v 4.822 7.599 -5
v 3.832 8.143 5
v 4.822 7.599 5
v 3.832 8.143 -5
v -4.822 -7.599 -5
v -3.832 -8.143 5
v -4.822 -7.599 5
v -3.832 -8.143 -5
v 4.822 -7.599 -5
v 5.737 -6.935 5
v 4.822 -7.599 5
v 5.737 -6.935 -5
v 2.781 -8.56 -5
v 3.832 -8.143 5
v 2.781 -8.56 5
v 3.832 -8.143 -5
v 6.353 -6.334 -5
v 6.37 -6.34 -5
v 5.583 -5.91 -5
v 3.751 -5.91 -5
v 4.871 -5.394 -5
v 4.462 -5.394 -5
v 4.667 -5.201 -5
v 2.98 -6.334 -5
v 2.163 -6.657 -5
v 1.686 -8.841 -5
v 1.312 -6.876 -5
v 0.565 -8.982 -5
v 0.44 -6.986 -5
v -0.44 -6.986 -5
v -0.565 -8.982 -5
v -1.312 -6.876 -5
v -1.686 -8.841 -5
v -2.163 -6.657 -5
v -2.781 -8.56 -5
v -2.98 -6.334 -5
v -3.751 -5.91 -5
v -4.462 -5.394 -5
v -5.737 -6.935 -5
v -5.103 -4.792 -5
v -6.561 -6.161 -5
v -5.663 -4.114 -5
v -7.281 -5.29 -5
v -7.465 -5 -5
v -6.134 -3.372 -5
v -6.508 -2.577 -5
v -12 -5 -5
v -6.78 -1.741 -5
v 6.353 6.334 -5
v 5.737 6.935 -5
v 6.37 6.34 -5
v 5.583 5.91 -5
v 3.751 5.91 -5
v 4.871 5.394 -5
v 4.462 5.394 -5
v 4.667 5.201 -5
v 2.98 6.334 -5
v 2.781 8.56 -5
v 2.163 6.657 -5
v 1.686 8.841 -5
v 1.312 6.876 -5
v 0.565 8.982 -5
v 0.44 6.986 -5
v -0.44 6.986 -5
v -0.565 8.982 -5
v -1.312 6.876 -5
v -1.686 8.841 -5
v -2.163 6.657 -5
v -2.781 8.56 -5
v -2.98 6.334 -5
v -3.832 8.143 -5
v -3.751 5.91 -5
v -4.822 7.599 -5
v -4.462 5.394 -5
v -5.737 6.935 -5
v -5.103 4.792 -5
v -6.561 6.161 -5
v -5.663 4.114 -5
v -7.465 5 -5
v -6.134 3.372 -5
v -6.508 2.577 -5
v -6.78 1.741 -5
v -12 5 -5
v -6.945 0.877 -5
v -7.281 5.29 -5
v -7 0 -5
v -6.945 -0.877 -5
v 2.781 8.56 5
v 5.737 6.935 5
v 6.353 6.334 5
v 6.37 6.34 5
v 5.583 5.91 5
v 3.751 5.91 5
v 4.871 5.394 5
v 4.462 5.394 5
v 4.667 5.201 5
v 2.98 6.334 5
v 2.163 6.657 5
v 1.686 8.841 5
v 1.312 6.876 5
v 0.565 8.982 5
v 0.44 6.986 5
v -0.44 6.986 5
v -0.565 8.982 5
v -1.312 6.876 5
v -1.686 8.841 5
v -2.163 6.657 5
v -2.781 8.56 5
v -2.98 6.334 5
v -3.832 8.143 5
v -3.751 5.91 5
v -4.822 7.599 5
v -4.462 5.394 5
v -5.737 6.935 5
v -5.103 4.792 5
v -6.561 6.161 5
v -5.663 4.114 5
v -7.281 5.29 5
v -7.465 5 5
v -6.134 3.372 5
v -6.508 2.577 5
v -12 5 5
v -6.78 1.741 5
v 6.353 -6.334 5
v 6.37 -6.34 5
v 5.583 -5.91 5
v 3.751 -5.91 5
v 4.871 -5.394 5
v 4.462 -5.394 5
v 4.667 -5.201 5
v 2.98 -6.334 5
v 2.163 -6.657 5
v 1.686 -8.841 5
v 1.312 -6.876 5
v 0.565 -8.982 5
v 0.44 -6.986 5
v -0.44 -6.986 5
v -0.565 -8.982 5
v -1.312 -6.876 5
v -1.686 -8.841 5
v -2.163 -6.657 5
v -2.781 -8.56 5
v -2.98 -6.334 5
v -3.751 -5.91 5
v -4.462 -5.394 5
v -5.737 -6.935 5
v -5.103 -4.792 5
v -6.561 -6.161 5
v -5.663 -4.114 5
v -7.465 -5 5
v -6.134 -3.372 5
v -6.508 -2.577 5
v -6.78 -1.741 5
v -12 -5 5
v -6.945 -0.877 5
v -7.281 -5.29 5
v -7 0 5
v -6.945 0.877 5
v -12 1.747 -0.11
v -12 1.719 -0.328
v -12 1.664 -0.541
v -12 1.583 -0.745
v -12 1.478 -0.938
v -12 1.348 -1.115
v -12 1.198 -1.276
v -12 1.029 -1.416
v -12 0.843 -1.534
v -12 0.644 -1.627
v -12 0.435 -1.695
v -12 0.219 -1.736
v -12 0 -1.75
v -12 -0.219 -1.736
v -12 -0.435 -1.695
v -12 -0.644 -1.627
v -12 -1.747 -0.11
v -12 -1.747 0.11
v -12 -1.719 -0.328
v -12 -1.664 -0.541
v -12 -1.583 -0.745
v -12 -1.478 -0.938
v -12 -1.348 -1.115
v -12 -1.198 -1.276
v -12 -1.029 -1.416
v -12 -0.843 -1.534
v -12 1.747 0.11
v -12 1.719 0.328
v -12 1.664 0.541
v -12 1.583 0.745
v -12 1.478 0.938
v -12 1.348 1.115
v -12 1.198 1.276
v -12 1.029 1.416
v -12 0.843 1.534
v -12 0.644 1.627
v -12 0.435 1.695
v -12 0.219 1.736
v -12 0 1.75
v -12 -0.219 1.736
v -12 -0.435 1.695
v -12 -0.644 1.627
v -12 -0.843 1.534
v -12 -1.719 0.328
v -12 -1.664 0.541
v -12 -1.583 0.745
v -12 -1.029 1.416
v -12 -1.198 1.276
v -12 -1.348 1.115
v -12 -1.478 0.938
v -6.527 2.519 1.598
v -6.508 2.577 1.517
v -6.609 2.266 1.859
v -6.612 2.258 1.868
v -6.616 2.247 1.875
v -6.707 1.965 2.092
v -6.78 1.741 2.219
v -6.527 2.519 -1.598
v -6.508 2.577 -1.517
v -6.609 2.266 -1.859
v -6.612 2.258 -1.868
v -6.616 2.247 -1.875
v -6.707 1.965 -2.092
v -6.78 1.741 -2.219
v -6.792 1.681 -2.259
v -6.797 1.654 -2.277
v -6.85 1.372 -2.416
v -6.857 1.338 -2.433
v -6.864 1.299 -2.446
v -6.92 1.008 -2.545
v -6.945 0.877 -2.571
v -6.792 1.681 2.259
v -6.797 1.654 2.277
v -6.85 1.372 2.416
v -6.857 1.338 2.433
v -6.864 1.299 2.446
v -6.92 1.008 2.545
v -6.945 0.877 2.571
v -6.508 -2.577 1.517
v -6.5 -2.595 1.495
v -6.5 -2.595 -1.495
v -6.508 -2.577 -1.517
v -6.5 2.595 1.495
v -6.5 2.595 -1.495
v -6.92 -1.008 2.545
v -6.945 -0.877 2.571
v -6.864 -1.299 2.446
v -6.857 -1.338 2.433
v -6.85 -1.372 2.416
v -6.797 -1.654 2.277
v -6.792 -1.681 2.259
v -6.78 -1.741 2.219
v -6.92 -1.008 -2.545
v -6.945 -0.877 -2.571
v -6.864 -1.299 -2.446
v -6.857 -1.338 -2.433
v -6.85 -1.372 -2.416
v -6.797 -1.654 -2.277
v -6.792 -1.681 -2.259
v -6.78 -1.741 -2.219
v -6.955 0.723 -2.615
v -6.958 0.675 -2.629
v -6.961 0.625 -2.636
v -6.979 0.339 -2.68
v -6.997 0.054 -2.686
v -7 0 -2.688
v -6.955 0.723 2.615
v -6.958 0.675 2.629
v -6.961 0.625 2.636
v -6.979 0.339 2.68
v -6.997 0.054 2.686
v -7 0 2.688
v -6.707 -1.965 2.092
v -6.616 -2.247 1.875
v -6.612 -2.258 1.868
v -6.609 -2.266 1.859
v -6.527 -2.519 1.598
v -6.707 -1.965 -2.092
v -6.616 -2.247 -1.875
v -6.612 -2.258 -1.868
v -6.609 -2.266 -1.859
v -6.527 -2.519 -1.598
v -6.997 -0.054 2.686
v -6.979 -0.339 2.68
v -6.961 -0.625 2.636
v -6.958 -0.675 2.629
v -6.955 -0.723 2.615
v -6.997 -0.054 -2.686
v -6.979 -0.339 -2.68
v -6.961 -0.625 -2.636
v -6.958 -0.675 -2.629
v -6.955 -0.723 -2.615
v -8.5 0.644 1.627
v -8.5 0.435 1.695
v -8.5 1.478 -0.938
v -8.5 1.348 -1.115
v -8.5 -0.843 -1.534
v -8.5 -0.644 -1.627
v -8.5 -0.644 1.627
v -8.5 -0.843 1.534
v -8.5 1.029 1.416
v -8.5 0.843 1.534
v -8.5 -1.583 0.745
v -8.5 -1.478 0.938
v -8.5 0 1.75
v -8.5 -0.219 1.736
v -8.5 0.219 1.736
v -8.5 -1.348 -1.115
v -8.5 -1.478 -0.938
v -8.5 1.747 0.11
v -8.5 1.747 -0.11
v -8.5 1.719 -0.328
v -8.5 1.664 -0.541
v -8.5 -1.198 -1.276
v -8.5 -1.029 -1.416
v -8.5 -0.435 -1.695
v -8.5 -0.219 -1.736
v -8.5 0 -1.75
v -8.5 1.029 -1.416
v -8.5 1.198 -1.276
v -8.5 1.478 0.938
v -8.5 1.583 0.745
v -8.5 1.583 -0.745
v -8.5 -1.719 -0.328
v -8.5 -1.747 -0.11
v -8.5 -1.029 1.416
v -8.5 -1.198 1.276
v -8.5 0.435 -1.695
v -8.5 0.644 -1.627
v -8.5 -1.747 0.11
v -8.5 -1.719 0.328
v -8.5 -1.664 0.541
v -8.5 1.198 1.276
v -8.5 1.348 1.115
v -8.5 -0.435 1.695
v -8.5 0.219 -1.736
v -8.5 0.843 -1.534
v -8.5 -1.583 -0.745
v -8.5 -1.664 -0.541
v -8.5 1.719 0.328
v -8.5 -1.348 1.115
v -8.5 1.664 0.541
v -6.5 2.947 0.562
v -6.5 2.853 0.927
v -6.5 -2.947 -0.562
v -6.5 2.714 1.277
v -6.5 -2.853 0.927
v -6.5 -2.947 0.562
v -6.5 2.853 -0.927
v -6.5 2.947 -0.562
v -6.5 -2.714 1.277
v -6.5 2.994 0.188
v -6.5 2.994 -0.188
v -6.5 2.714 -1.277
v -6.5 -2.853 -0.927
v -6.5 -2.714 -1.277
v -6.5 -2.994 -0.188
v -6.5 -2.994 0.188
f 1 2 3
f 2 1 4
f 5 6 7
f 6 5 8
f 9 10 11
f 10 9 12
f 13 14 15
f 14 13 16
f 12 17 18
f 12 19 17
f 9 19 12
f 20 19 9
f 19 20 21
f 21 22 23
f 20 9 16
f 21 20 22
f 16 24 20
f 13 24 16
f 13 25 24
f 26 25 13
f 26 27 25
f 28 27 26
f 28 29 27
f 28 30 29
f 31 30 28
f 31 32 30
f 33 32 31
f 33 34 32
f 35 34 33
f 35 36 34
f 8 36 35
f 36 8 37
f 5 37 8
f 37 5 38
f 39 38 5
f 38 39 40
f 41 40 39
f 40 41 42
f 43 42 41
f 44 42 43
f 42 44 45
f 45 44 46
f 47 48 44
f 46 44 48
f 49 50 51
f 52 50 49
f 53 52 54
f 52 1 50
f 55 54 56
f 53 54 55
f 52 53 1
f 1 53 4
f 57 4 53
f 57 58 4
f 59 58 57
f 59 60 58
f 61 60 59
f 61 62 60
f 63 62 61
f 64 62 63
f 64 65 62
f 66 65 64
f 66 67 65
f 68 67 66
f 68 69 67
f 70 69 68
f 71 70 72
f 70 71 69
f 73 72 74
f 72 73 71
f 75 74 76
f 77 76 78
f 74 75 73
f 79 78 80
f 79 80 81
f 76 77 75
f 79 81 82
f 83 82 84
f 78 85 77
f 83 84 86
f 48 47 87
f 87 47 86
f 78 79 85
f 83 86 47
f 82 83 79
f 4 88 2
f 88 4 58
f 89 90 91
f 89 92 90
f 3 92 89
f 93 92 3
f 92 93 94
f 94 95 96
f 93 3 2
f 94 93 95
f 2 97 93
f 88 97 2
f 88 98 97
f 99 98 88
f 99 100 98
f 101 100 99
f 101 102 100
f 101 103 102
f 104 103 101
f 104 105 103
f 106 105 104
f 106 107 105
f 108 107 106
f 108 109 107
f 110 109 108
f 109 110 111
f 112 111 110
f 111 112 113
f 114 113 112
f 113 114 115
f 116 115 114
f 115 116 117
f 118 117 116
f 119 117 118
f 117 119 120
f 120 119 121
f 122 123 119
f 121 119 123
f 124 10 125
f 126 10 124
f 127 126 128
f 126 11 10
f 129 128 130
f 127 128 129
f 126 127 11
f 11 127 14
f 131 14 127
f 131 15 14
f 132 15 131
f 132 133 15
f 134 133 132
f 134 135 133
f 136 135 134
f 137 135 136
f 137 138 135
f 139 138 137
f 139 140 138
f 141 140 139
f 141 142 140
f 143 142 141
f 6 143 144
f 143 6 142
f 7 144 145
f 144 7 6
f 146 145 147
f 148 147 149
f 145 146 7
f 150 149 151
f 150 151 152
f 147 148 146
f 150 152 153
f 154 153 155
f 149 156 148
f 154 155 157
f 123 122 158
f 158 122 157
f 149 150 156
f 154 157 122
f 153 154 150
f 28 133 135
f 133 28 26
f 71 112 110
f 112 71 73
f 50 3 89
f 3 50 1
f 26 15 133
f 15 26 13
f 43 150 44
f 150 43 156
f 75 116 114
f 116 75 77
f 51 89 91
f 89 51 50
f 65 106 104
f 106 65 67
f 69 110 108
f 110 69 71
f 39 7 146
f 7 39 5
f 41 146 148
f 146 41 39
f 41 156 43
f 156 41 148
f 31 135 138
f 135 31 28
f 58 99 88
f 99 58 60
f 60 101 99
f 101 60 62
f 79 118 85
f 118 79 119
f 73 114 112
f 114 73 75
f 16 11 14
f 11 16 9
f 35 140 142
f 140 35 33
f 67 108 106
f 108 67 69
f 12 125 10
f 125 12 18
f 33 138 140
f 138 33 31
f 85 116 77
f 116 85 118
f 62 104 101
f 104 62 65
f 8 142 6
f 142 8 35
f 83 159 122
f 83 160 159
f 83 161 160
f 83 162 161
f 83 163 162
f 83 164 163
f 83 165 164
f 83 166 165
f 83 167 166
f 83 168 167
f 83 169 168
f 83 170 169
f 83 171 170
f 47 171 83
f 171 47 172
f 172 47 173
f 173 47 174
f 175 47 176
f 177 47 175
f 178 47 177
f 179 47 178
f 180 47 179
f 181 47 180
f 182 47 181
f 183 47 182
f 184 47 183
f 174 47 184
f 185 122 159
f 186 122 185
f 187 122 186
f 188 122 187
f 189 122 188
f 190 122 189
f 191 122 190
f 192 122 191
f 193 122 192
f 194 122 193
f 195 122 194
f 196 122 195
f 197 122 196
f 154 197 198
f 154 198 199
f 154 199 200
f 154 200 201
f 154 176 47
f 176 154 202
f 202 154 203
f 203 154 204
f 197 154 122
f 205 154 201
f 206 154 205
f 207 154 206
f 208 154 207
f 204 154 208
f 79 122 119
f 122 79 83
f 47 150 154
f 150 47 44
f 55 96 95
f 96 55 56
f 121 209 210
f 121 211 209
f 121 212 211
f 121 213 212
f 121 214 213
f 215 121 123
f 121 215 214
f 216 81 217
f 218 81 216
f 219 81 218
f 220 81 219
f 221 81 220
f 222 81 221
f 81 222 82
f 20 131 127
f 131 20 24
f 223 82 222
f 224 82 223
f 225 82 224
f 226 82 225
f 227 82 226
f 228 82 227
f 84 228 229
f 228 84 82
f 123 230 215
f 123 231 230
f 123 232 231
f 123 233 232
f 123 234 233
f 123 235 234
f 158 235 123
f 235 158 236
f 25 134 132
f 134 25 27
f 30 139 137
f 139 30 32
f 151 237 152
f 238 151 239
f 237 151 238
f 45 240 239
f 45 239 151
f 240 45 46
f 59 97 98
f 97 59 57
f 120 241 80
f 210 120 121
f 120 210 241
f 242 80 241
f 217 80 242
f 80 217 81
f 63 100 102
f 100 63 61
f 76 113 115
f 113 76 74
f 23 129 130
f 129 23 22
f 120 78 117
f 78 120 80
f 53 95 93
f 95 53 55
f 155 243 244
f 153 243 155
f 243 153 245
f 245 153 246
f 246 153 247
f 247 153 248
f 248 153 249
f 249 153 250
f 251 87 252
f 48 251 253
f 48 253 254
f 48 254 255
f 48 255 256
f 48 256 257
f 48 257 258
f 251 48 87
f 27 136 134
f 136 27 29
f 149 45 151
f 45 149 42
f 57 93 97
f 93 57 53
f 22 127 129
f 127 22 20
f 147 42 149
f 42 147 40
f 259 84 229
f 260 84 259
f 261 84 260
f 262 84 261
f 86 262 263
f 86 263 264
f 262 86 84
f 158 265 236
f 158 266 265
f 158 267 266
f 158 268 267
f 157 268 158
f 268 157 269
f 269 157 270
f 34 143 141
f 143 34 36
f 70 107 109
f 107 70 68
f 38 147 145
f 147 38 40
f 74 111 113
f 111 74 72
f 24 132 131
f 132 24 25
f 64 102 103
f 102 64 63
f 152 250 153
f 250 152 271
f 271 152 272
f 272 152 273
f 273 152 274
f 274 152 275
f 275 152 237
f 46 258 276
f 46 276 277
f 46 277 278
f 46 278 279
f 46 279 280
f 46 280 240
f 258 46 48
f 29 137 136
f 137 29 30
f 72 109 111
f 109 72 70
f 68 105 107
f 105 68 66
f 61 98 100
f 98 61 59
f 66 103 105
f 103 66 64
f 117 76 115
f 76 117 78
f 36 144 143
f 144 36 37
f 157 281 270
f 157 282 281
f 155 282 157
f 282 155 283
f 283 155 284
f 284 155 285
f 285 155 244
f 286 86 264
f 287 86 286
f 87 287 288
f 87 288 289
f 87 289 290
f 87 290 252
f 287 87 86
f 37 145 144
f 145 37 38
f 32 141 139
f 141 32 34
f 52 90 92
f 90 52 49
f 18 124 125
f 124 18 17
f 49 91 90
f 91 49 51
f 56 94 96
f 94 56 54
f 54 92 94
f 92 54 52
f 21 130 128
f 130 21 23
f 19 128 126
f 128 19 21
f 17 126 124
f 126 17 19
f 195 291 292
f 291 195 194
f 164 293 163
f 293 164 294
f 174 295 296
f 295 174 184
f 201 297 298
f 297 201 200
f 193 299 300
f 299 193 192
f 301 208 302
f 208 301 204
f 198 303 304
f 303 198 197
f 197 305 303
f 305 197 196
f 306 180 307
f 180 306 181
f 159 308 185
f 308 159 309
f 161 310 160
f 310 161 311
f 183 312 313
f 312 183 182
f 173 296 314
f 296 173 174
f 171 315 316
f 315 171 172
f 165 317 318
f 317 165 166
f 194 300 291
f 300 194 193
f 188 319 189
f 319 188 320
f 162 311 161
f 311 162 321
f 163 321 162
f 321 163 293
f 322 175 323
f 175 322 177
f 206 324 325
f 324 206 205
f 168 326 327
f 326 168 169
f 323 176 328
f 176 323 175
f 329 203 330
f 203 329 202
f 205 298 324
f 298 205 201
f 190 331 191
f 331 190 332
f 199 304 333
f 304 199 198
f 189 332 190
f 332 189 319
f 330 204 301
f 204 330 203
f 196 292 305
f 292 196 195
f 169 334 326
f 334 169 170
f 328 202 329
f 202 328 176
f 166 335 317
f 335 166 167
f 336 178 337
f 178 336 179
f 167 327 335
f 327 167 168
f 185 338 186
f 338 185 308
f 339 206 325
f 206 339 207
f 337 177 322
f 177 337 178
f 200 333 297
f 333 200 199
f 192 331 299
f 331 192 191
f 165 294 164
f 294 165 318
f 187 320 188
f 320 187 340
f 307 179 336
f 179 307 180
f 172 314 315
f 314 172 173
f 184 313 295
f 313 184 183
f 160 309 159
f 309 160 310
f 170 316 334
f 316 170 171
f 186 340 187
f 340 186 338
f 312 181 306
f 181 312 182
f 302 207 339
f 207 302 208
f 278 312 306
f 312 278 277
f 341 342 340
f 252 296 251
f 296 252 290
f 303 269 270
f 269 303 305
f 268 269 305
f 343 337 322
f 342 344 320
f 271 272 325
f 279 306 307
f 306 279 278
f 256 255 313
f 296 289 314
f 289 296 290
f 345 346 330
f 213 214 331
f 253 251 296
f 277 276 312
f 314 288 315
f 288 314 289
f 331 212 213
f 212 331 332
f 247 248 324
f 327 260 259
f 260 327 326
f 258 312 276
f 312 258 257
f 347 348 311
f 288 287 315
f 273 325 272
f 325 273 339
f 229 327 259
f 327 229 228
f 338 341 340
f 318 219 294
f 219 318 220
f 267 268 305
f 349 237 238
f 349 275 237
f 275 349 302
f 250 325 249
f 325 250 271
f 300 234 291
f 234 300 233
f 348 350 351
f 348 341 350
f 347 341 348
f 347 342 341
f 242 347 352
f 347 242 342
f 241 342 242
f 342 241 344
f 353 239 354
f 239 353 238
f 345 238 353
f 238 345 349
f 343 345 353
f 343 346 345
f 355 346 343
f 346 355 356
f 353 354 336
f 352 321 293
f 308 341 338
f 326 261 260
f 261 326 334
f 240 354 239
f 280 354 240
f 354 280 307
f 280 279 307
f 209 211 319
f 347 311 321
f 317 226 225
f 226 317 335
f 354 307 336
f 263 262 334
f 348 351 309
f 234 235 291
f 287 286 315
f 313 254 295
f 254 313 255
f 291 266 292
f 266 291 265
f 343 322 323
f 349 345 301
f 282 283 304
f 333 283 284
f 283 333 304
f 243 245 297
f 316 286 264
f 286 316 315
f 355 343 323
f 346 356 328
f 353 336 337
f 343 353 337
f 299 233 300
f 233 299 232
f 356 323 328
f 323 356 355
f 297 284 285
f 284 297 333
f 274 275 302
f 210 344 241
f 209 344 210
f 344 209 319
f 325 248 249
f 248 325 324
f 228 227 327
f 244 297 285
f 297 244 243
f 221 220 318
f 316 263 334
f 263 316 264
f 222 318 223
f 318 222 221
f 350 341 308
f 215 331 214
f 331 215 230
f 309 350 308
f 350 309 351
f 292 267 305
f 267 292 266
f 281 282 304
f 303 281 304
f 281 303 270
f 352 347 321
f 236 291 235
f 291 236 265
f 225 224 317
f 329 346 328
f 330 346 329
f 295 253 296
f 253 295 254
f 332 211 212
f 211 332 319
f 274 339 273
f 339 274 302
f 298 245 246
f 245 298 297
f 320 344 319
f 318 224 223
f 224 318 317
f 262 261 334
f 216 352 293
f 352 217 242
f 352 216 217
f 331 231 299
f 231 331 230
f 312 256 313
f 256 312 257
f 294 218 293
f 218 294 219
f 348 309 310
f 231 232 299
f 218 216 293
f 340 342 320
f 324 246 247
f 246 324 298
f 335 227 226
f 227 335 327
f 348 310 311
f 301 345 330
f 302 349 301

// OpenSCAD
// Tutor diameter
HOSE_DIAMETER = 14; // [4:30]
// Thickness of the cylinders 
HOOK_THICKNESS = 2; // [1:10]
// Thickness of the hook
THICKNESS = 10; // [2:20]

BASE_WIDTH = 10;
BASE_THICKNESS = 5;

SCREW_DIAMETER = 3.5;

SCREW_HEAD_SIZE = 6;
SCREW_THICKNESS = 1;

$fn = 50;
TOTAL_BASE_SIZE = BASE_THICKNESS + HOSE_DIAMETER / 2;
difference() {
    union () {
        cylinder(h = THICKNESS, d = HOSE_DIAMETER + 2 * HOOK_THICKNESS, center = true);
        translate([-TOTAL_BASE_SIZE/ 2, 0, 0]) color("green") cube([TOTAL_BASE_SIZE, BASE_WIDTH, THICKNESS], center = true);
    }
    cylinder(h = THICKNESS, d = HOSE_DIAMETER, center = true);
    translate([HOSE_DIAMETER/1.5, 0, 0]) cylinder(h = THICKNESS, d = HOSE_DIAMETER, center = true);
    rotate([0, -90, 0]) cylinder(d = SCREW_DIAMETER, h = TOTAL_BASE_SIZE);
translate([-HOSE_DIAMETER / 2 + SCREW_THICKNESS / 2, 0, 0]) rotate([0, -90, 0]) cylinder(d1 = SCREW_HEAD_SIZE, d2 = SCREW_DIAMETER, h = SCREW_THICKNESS * 2);
}
